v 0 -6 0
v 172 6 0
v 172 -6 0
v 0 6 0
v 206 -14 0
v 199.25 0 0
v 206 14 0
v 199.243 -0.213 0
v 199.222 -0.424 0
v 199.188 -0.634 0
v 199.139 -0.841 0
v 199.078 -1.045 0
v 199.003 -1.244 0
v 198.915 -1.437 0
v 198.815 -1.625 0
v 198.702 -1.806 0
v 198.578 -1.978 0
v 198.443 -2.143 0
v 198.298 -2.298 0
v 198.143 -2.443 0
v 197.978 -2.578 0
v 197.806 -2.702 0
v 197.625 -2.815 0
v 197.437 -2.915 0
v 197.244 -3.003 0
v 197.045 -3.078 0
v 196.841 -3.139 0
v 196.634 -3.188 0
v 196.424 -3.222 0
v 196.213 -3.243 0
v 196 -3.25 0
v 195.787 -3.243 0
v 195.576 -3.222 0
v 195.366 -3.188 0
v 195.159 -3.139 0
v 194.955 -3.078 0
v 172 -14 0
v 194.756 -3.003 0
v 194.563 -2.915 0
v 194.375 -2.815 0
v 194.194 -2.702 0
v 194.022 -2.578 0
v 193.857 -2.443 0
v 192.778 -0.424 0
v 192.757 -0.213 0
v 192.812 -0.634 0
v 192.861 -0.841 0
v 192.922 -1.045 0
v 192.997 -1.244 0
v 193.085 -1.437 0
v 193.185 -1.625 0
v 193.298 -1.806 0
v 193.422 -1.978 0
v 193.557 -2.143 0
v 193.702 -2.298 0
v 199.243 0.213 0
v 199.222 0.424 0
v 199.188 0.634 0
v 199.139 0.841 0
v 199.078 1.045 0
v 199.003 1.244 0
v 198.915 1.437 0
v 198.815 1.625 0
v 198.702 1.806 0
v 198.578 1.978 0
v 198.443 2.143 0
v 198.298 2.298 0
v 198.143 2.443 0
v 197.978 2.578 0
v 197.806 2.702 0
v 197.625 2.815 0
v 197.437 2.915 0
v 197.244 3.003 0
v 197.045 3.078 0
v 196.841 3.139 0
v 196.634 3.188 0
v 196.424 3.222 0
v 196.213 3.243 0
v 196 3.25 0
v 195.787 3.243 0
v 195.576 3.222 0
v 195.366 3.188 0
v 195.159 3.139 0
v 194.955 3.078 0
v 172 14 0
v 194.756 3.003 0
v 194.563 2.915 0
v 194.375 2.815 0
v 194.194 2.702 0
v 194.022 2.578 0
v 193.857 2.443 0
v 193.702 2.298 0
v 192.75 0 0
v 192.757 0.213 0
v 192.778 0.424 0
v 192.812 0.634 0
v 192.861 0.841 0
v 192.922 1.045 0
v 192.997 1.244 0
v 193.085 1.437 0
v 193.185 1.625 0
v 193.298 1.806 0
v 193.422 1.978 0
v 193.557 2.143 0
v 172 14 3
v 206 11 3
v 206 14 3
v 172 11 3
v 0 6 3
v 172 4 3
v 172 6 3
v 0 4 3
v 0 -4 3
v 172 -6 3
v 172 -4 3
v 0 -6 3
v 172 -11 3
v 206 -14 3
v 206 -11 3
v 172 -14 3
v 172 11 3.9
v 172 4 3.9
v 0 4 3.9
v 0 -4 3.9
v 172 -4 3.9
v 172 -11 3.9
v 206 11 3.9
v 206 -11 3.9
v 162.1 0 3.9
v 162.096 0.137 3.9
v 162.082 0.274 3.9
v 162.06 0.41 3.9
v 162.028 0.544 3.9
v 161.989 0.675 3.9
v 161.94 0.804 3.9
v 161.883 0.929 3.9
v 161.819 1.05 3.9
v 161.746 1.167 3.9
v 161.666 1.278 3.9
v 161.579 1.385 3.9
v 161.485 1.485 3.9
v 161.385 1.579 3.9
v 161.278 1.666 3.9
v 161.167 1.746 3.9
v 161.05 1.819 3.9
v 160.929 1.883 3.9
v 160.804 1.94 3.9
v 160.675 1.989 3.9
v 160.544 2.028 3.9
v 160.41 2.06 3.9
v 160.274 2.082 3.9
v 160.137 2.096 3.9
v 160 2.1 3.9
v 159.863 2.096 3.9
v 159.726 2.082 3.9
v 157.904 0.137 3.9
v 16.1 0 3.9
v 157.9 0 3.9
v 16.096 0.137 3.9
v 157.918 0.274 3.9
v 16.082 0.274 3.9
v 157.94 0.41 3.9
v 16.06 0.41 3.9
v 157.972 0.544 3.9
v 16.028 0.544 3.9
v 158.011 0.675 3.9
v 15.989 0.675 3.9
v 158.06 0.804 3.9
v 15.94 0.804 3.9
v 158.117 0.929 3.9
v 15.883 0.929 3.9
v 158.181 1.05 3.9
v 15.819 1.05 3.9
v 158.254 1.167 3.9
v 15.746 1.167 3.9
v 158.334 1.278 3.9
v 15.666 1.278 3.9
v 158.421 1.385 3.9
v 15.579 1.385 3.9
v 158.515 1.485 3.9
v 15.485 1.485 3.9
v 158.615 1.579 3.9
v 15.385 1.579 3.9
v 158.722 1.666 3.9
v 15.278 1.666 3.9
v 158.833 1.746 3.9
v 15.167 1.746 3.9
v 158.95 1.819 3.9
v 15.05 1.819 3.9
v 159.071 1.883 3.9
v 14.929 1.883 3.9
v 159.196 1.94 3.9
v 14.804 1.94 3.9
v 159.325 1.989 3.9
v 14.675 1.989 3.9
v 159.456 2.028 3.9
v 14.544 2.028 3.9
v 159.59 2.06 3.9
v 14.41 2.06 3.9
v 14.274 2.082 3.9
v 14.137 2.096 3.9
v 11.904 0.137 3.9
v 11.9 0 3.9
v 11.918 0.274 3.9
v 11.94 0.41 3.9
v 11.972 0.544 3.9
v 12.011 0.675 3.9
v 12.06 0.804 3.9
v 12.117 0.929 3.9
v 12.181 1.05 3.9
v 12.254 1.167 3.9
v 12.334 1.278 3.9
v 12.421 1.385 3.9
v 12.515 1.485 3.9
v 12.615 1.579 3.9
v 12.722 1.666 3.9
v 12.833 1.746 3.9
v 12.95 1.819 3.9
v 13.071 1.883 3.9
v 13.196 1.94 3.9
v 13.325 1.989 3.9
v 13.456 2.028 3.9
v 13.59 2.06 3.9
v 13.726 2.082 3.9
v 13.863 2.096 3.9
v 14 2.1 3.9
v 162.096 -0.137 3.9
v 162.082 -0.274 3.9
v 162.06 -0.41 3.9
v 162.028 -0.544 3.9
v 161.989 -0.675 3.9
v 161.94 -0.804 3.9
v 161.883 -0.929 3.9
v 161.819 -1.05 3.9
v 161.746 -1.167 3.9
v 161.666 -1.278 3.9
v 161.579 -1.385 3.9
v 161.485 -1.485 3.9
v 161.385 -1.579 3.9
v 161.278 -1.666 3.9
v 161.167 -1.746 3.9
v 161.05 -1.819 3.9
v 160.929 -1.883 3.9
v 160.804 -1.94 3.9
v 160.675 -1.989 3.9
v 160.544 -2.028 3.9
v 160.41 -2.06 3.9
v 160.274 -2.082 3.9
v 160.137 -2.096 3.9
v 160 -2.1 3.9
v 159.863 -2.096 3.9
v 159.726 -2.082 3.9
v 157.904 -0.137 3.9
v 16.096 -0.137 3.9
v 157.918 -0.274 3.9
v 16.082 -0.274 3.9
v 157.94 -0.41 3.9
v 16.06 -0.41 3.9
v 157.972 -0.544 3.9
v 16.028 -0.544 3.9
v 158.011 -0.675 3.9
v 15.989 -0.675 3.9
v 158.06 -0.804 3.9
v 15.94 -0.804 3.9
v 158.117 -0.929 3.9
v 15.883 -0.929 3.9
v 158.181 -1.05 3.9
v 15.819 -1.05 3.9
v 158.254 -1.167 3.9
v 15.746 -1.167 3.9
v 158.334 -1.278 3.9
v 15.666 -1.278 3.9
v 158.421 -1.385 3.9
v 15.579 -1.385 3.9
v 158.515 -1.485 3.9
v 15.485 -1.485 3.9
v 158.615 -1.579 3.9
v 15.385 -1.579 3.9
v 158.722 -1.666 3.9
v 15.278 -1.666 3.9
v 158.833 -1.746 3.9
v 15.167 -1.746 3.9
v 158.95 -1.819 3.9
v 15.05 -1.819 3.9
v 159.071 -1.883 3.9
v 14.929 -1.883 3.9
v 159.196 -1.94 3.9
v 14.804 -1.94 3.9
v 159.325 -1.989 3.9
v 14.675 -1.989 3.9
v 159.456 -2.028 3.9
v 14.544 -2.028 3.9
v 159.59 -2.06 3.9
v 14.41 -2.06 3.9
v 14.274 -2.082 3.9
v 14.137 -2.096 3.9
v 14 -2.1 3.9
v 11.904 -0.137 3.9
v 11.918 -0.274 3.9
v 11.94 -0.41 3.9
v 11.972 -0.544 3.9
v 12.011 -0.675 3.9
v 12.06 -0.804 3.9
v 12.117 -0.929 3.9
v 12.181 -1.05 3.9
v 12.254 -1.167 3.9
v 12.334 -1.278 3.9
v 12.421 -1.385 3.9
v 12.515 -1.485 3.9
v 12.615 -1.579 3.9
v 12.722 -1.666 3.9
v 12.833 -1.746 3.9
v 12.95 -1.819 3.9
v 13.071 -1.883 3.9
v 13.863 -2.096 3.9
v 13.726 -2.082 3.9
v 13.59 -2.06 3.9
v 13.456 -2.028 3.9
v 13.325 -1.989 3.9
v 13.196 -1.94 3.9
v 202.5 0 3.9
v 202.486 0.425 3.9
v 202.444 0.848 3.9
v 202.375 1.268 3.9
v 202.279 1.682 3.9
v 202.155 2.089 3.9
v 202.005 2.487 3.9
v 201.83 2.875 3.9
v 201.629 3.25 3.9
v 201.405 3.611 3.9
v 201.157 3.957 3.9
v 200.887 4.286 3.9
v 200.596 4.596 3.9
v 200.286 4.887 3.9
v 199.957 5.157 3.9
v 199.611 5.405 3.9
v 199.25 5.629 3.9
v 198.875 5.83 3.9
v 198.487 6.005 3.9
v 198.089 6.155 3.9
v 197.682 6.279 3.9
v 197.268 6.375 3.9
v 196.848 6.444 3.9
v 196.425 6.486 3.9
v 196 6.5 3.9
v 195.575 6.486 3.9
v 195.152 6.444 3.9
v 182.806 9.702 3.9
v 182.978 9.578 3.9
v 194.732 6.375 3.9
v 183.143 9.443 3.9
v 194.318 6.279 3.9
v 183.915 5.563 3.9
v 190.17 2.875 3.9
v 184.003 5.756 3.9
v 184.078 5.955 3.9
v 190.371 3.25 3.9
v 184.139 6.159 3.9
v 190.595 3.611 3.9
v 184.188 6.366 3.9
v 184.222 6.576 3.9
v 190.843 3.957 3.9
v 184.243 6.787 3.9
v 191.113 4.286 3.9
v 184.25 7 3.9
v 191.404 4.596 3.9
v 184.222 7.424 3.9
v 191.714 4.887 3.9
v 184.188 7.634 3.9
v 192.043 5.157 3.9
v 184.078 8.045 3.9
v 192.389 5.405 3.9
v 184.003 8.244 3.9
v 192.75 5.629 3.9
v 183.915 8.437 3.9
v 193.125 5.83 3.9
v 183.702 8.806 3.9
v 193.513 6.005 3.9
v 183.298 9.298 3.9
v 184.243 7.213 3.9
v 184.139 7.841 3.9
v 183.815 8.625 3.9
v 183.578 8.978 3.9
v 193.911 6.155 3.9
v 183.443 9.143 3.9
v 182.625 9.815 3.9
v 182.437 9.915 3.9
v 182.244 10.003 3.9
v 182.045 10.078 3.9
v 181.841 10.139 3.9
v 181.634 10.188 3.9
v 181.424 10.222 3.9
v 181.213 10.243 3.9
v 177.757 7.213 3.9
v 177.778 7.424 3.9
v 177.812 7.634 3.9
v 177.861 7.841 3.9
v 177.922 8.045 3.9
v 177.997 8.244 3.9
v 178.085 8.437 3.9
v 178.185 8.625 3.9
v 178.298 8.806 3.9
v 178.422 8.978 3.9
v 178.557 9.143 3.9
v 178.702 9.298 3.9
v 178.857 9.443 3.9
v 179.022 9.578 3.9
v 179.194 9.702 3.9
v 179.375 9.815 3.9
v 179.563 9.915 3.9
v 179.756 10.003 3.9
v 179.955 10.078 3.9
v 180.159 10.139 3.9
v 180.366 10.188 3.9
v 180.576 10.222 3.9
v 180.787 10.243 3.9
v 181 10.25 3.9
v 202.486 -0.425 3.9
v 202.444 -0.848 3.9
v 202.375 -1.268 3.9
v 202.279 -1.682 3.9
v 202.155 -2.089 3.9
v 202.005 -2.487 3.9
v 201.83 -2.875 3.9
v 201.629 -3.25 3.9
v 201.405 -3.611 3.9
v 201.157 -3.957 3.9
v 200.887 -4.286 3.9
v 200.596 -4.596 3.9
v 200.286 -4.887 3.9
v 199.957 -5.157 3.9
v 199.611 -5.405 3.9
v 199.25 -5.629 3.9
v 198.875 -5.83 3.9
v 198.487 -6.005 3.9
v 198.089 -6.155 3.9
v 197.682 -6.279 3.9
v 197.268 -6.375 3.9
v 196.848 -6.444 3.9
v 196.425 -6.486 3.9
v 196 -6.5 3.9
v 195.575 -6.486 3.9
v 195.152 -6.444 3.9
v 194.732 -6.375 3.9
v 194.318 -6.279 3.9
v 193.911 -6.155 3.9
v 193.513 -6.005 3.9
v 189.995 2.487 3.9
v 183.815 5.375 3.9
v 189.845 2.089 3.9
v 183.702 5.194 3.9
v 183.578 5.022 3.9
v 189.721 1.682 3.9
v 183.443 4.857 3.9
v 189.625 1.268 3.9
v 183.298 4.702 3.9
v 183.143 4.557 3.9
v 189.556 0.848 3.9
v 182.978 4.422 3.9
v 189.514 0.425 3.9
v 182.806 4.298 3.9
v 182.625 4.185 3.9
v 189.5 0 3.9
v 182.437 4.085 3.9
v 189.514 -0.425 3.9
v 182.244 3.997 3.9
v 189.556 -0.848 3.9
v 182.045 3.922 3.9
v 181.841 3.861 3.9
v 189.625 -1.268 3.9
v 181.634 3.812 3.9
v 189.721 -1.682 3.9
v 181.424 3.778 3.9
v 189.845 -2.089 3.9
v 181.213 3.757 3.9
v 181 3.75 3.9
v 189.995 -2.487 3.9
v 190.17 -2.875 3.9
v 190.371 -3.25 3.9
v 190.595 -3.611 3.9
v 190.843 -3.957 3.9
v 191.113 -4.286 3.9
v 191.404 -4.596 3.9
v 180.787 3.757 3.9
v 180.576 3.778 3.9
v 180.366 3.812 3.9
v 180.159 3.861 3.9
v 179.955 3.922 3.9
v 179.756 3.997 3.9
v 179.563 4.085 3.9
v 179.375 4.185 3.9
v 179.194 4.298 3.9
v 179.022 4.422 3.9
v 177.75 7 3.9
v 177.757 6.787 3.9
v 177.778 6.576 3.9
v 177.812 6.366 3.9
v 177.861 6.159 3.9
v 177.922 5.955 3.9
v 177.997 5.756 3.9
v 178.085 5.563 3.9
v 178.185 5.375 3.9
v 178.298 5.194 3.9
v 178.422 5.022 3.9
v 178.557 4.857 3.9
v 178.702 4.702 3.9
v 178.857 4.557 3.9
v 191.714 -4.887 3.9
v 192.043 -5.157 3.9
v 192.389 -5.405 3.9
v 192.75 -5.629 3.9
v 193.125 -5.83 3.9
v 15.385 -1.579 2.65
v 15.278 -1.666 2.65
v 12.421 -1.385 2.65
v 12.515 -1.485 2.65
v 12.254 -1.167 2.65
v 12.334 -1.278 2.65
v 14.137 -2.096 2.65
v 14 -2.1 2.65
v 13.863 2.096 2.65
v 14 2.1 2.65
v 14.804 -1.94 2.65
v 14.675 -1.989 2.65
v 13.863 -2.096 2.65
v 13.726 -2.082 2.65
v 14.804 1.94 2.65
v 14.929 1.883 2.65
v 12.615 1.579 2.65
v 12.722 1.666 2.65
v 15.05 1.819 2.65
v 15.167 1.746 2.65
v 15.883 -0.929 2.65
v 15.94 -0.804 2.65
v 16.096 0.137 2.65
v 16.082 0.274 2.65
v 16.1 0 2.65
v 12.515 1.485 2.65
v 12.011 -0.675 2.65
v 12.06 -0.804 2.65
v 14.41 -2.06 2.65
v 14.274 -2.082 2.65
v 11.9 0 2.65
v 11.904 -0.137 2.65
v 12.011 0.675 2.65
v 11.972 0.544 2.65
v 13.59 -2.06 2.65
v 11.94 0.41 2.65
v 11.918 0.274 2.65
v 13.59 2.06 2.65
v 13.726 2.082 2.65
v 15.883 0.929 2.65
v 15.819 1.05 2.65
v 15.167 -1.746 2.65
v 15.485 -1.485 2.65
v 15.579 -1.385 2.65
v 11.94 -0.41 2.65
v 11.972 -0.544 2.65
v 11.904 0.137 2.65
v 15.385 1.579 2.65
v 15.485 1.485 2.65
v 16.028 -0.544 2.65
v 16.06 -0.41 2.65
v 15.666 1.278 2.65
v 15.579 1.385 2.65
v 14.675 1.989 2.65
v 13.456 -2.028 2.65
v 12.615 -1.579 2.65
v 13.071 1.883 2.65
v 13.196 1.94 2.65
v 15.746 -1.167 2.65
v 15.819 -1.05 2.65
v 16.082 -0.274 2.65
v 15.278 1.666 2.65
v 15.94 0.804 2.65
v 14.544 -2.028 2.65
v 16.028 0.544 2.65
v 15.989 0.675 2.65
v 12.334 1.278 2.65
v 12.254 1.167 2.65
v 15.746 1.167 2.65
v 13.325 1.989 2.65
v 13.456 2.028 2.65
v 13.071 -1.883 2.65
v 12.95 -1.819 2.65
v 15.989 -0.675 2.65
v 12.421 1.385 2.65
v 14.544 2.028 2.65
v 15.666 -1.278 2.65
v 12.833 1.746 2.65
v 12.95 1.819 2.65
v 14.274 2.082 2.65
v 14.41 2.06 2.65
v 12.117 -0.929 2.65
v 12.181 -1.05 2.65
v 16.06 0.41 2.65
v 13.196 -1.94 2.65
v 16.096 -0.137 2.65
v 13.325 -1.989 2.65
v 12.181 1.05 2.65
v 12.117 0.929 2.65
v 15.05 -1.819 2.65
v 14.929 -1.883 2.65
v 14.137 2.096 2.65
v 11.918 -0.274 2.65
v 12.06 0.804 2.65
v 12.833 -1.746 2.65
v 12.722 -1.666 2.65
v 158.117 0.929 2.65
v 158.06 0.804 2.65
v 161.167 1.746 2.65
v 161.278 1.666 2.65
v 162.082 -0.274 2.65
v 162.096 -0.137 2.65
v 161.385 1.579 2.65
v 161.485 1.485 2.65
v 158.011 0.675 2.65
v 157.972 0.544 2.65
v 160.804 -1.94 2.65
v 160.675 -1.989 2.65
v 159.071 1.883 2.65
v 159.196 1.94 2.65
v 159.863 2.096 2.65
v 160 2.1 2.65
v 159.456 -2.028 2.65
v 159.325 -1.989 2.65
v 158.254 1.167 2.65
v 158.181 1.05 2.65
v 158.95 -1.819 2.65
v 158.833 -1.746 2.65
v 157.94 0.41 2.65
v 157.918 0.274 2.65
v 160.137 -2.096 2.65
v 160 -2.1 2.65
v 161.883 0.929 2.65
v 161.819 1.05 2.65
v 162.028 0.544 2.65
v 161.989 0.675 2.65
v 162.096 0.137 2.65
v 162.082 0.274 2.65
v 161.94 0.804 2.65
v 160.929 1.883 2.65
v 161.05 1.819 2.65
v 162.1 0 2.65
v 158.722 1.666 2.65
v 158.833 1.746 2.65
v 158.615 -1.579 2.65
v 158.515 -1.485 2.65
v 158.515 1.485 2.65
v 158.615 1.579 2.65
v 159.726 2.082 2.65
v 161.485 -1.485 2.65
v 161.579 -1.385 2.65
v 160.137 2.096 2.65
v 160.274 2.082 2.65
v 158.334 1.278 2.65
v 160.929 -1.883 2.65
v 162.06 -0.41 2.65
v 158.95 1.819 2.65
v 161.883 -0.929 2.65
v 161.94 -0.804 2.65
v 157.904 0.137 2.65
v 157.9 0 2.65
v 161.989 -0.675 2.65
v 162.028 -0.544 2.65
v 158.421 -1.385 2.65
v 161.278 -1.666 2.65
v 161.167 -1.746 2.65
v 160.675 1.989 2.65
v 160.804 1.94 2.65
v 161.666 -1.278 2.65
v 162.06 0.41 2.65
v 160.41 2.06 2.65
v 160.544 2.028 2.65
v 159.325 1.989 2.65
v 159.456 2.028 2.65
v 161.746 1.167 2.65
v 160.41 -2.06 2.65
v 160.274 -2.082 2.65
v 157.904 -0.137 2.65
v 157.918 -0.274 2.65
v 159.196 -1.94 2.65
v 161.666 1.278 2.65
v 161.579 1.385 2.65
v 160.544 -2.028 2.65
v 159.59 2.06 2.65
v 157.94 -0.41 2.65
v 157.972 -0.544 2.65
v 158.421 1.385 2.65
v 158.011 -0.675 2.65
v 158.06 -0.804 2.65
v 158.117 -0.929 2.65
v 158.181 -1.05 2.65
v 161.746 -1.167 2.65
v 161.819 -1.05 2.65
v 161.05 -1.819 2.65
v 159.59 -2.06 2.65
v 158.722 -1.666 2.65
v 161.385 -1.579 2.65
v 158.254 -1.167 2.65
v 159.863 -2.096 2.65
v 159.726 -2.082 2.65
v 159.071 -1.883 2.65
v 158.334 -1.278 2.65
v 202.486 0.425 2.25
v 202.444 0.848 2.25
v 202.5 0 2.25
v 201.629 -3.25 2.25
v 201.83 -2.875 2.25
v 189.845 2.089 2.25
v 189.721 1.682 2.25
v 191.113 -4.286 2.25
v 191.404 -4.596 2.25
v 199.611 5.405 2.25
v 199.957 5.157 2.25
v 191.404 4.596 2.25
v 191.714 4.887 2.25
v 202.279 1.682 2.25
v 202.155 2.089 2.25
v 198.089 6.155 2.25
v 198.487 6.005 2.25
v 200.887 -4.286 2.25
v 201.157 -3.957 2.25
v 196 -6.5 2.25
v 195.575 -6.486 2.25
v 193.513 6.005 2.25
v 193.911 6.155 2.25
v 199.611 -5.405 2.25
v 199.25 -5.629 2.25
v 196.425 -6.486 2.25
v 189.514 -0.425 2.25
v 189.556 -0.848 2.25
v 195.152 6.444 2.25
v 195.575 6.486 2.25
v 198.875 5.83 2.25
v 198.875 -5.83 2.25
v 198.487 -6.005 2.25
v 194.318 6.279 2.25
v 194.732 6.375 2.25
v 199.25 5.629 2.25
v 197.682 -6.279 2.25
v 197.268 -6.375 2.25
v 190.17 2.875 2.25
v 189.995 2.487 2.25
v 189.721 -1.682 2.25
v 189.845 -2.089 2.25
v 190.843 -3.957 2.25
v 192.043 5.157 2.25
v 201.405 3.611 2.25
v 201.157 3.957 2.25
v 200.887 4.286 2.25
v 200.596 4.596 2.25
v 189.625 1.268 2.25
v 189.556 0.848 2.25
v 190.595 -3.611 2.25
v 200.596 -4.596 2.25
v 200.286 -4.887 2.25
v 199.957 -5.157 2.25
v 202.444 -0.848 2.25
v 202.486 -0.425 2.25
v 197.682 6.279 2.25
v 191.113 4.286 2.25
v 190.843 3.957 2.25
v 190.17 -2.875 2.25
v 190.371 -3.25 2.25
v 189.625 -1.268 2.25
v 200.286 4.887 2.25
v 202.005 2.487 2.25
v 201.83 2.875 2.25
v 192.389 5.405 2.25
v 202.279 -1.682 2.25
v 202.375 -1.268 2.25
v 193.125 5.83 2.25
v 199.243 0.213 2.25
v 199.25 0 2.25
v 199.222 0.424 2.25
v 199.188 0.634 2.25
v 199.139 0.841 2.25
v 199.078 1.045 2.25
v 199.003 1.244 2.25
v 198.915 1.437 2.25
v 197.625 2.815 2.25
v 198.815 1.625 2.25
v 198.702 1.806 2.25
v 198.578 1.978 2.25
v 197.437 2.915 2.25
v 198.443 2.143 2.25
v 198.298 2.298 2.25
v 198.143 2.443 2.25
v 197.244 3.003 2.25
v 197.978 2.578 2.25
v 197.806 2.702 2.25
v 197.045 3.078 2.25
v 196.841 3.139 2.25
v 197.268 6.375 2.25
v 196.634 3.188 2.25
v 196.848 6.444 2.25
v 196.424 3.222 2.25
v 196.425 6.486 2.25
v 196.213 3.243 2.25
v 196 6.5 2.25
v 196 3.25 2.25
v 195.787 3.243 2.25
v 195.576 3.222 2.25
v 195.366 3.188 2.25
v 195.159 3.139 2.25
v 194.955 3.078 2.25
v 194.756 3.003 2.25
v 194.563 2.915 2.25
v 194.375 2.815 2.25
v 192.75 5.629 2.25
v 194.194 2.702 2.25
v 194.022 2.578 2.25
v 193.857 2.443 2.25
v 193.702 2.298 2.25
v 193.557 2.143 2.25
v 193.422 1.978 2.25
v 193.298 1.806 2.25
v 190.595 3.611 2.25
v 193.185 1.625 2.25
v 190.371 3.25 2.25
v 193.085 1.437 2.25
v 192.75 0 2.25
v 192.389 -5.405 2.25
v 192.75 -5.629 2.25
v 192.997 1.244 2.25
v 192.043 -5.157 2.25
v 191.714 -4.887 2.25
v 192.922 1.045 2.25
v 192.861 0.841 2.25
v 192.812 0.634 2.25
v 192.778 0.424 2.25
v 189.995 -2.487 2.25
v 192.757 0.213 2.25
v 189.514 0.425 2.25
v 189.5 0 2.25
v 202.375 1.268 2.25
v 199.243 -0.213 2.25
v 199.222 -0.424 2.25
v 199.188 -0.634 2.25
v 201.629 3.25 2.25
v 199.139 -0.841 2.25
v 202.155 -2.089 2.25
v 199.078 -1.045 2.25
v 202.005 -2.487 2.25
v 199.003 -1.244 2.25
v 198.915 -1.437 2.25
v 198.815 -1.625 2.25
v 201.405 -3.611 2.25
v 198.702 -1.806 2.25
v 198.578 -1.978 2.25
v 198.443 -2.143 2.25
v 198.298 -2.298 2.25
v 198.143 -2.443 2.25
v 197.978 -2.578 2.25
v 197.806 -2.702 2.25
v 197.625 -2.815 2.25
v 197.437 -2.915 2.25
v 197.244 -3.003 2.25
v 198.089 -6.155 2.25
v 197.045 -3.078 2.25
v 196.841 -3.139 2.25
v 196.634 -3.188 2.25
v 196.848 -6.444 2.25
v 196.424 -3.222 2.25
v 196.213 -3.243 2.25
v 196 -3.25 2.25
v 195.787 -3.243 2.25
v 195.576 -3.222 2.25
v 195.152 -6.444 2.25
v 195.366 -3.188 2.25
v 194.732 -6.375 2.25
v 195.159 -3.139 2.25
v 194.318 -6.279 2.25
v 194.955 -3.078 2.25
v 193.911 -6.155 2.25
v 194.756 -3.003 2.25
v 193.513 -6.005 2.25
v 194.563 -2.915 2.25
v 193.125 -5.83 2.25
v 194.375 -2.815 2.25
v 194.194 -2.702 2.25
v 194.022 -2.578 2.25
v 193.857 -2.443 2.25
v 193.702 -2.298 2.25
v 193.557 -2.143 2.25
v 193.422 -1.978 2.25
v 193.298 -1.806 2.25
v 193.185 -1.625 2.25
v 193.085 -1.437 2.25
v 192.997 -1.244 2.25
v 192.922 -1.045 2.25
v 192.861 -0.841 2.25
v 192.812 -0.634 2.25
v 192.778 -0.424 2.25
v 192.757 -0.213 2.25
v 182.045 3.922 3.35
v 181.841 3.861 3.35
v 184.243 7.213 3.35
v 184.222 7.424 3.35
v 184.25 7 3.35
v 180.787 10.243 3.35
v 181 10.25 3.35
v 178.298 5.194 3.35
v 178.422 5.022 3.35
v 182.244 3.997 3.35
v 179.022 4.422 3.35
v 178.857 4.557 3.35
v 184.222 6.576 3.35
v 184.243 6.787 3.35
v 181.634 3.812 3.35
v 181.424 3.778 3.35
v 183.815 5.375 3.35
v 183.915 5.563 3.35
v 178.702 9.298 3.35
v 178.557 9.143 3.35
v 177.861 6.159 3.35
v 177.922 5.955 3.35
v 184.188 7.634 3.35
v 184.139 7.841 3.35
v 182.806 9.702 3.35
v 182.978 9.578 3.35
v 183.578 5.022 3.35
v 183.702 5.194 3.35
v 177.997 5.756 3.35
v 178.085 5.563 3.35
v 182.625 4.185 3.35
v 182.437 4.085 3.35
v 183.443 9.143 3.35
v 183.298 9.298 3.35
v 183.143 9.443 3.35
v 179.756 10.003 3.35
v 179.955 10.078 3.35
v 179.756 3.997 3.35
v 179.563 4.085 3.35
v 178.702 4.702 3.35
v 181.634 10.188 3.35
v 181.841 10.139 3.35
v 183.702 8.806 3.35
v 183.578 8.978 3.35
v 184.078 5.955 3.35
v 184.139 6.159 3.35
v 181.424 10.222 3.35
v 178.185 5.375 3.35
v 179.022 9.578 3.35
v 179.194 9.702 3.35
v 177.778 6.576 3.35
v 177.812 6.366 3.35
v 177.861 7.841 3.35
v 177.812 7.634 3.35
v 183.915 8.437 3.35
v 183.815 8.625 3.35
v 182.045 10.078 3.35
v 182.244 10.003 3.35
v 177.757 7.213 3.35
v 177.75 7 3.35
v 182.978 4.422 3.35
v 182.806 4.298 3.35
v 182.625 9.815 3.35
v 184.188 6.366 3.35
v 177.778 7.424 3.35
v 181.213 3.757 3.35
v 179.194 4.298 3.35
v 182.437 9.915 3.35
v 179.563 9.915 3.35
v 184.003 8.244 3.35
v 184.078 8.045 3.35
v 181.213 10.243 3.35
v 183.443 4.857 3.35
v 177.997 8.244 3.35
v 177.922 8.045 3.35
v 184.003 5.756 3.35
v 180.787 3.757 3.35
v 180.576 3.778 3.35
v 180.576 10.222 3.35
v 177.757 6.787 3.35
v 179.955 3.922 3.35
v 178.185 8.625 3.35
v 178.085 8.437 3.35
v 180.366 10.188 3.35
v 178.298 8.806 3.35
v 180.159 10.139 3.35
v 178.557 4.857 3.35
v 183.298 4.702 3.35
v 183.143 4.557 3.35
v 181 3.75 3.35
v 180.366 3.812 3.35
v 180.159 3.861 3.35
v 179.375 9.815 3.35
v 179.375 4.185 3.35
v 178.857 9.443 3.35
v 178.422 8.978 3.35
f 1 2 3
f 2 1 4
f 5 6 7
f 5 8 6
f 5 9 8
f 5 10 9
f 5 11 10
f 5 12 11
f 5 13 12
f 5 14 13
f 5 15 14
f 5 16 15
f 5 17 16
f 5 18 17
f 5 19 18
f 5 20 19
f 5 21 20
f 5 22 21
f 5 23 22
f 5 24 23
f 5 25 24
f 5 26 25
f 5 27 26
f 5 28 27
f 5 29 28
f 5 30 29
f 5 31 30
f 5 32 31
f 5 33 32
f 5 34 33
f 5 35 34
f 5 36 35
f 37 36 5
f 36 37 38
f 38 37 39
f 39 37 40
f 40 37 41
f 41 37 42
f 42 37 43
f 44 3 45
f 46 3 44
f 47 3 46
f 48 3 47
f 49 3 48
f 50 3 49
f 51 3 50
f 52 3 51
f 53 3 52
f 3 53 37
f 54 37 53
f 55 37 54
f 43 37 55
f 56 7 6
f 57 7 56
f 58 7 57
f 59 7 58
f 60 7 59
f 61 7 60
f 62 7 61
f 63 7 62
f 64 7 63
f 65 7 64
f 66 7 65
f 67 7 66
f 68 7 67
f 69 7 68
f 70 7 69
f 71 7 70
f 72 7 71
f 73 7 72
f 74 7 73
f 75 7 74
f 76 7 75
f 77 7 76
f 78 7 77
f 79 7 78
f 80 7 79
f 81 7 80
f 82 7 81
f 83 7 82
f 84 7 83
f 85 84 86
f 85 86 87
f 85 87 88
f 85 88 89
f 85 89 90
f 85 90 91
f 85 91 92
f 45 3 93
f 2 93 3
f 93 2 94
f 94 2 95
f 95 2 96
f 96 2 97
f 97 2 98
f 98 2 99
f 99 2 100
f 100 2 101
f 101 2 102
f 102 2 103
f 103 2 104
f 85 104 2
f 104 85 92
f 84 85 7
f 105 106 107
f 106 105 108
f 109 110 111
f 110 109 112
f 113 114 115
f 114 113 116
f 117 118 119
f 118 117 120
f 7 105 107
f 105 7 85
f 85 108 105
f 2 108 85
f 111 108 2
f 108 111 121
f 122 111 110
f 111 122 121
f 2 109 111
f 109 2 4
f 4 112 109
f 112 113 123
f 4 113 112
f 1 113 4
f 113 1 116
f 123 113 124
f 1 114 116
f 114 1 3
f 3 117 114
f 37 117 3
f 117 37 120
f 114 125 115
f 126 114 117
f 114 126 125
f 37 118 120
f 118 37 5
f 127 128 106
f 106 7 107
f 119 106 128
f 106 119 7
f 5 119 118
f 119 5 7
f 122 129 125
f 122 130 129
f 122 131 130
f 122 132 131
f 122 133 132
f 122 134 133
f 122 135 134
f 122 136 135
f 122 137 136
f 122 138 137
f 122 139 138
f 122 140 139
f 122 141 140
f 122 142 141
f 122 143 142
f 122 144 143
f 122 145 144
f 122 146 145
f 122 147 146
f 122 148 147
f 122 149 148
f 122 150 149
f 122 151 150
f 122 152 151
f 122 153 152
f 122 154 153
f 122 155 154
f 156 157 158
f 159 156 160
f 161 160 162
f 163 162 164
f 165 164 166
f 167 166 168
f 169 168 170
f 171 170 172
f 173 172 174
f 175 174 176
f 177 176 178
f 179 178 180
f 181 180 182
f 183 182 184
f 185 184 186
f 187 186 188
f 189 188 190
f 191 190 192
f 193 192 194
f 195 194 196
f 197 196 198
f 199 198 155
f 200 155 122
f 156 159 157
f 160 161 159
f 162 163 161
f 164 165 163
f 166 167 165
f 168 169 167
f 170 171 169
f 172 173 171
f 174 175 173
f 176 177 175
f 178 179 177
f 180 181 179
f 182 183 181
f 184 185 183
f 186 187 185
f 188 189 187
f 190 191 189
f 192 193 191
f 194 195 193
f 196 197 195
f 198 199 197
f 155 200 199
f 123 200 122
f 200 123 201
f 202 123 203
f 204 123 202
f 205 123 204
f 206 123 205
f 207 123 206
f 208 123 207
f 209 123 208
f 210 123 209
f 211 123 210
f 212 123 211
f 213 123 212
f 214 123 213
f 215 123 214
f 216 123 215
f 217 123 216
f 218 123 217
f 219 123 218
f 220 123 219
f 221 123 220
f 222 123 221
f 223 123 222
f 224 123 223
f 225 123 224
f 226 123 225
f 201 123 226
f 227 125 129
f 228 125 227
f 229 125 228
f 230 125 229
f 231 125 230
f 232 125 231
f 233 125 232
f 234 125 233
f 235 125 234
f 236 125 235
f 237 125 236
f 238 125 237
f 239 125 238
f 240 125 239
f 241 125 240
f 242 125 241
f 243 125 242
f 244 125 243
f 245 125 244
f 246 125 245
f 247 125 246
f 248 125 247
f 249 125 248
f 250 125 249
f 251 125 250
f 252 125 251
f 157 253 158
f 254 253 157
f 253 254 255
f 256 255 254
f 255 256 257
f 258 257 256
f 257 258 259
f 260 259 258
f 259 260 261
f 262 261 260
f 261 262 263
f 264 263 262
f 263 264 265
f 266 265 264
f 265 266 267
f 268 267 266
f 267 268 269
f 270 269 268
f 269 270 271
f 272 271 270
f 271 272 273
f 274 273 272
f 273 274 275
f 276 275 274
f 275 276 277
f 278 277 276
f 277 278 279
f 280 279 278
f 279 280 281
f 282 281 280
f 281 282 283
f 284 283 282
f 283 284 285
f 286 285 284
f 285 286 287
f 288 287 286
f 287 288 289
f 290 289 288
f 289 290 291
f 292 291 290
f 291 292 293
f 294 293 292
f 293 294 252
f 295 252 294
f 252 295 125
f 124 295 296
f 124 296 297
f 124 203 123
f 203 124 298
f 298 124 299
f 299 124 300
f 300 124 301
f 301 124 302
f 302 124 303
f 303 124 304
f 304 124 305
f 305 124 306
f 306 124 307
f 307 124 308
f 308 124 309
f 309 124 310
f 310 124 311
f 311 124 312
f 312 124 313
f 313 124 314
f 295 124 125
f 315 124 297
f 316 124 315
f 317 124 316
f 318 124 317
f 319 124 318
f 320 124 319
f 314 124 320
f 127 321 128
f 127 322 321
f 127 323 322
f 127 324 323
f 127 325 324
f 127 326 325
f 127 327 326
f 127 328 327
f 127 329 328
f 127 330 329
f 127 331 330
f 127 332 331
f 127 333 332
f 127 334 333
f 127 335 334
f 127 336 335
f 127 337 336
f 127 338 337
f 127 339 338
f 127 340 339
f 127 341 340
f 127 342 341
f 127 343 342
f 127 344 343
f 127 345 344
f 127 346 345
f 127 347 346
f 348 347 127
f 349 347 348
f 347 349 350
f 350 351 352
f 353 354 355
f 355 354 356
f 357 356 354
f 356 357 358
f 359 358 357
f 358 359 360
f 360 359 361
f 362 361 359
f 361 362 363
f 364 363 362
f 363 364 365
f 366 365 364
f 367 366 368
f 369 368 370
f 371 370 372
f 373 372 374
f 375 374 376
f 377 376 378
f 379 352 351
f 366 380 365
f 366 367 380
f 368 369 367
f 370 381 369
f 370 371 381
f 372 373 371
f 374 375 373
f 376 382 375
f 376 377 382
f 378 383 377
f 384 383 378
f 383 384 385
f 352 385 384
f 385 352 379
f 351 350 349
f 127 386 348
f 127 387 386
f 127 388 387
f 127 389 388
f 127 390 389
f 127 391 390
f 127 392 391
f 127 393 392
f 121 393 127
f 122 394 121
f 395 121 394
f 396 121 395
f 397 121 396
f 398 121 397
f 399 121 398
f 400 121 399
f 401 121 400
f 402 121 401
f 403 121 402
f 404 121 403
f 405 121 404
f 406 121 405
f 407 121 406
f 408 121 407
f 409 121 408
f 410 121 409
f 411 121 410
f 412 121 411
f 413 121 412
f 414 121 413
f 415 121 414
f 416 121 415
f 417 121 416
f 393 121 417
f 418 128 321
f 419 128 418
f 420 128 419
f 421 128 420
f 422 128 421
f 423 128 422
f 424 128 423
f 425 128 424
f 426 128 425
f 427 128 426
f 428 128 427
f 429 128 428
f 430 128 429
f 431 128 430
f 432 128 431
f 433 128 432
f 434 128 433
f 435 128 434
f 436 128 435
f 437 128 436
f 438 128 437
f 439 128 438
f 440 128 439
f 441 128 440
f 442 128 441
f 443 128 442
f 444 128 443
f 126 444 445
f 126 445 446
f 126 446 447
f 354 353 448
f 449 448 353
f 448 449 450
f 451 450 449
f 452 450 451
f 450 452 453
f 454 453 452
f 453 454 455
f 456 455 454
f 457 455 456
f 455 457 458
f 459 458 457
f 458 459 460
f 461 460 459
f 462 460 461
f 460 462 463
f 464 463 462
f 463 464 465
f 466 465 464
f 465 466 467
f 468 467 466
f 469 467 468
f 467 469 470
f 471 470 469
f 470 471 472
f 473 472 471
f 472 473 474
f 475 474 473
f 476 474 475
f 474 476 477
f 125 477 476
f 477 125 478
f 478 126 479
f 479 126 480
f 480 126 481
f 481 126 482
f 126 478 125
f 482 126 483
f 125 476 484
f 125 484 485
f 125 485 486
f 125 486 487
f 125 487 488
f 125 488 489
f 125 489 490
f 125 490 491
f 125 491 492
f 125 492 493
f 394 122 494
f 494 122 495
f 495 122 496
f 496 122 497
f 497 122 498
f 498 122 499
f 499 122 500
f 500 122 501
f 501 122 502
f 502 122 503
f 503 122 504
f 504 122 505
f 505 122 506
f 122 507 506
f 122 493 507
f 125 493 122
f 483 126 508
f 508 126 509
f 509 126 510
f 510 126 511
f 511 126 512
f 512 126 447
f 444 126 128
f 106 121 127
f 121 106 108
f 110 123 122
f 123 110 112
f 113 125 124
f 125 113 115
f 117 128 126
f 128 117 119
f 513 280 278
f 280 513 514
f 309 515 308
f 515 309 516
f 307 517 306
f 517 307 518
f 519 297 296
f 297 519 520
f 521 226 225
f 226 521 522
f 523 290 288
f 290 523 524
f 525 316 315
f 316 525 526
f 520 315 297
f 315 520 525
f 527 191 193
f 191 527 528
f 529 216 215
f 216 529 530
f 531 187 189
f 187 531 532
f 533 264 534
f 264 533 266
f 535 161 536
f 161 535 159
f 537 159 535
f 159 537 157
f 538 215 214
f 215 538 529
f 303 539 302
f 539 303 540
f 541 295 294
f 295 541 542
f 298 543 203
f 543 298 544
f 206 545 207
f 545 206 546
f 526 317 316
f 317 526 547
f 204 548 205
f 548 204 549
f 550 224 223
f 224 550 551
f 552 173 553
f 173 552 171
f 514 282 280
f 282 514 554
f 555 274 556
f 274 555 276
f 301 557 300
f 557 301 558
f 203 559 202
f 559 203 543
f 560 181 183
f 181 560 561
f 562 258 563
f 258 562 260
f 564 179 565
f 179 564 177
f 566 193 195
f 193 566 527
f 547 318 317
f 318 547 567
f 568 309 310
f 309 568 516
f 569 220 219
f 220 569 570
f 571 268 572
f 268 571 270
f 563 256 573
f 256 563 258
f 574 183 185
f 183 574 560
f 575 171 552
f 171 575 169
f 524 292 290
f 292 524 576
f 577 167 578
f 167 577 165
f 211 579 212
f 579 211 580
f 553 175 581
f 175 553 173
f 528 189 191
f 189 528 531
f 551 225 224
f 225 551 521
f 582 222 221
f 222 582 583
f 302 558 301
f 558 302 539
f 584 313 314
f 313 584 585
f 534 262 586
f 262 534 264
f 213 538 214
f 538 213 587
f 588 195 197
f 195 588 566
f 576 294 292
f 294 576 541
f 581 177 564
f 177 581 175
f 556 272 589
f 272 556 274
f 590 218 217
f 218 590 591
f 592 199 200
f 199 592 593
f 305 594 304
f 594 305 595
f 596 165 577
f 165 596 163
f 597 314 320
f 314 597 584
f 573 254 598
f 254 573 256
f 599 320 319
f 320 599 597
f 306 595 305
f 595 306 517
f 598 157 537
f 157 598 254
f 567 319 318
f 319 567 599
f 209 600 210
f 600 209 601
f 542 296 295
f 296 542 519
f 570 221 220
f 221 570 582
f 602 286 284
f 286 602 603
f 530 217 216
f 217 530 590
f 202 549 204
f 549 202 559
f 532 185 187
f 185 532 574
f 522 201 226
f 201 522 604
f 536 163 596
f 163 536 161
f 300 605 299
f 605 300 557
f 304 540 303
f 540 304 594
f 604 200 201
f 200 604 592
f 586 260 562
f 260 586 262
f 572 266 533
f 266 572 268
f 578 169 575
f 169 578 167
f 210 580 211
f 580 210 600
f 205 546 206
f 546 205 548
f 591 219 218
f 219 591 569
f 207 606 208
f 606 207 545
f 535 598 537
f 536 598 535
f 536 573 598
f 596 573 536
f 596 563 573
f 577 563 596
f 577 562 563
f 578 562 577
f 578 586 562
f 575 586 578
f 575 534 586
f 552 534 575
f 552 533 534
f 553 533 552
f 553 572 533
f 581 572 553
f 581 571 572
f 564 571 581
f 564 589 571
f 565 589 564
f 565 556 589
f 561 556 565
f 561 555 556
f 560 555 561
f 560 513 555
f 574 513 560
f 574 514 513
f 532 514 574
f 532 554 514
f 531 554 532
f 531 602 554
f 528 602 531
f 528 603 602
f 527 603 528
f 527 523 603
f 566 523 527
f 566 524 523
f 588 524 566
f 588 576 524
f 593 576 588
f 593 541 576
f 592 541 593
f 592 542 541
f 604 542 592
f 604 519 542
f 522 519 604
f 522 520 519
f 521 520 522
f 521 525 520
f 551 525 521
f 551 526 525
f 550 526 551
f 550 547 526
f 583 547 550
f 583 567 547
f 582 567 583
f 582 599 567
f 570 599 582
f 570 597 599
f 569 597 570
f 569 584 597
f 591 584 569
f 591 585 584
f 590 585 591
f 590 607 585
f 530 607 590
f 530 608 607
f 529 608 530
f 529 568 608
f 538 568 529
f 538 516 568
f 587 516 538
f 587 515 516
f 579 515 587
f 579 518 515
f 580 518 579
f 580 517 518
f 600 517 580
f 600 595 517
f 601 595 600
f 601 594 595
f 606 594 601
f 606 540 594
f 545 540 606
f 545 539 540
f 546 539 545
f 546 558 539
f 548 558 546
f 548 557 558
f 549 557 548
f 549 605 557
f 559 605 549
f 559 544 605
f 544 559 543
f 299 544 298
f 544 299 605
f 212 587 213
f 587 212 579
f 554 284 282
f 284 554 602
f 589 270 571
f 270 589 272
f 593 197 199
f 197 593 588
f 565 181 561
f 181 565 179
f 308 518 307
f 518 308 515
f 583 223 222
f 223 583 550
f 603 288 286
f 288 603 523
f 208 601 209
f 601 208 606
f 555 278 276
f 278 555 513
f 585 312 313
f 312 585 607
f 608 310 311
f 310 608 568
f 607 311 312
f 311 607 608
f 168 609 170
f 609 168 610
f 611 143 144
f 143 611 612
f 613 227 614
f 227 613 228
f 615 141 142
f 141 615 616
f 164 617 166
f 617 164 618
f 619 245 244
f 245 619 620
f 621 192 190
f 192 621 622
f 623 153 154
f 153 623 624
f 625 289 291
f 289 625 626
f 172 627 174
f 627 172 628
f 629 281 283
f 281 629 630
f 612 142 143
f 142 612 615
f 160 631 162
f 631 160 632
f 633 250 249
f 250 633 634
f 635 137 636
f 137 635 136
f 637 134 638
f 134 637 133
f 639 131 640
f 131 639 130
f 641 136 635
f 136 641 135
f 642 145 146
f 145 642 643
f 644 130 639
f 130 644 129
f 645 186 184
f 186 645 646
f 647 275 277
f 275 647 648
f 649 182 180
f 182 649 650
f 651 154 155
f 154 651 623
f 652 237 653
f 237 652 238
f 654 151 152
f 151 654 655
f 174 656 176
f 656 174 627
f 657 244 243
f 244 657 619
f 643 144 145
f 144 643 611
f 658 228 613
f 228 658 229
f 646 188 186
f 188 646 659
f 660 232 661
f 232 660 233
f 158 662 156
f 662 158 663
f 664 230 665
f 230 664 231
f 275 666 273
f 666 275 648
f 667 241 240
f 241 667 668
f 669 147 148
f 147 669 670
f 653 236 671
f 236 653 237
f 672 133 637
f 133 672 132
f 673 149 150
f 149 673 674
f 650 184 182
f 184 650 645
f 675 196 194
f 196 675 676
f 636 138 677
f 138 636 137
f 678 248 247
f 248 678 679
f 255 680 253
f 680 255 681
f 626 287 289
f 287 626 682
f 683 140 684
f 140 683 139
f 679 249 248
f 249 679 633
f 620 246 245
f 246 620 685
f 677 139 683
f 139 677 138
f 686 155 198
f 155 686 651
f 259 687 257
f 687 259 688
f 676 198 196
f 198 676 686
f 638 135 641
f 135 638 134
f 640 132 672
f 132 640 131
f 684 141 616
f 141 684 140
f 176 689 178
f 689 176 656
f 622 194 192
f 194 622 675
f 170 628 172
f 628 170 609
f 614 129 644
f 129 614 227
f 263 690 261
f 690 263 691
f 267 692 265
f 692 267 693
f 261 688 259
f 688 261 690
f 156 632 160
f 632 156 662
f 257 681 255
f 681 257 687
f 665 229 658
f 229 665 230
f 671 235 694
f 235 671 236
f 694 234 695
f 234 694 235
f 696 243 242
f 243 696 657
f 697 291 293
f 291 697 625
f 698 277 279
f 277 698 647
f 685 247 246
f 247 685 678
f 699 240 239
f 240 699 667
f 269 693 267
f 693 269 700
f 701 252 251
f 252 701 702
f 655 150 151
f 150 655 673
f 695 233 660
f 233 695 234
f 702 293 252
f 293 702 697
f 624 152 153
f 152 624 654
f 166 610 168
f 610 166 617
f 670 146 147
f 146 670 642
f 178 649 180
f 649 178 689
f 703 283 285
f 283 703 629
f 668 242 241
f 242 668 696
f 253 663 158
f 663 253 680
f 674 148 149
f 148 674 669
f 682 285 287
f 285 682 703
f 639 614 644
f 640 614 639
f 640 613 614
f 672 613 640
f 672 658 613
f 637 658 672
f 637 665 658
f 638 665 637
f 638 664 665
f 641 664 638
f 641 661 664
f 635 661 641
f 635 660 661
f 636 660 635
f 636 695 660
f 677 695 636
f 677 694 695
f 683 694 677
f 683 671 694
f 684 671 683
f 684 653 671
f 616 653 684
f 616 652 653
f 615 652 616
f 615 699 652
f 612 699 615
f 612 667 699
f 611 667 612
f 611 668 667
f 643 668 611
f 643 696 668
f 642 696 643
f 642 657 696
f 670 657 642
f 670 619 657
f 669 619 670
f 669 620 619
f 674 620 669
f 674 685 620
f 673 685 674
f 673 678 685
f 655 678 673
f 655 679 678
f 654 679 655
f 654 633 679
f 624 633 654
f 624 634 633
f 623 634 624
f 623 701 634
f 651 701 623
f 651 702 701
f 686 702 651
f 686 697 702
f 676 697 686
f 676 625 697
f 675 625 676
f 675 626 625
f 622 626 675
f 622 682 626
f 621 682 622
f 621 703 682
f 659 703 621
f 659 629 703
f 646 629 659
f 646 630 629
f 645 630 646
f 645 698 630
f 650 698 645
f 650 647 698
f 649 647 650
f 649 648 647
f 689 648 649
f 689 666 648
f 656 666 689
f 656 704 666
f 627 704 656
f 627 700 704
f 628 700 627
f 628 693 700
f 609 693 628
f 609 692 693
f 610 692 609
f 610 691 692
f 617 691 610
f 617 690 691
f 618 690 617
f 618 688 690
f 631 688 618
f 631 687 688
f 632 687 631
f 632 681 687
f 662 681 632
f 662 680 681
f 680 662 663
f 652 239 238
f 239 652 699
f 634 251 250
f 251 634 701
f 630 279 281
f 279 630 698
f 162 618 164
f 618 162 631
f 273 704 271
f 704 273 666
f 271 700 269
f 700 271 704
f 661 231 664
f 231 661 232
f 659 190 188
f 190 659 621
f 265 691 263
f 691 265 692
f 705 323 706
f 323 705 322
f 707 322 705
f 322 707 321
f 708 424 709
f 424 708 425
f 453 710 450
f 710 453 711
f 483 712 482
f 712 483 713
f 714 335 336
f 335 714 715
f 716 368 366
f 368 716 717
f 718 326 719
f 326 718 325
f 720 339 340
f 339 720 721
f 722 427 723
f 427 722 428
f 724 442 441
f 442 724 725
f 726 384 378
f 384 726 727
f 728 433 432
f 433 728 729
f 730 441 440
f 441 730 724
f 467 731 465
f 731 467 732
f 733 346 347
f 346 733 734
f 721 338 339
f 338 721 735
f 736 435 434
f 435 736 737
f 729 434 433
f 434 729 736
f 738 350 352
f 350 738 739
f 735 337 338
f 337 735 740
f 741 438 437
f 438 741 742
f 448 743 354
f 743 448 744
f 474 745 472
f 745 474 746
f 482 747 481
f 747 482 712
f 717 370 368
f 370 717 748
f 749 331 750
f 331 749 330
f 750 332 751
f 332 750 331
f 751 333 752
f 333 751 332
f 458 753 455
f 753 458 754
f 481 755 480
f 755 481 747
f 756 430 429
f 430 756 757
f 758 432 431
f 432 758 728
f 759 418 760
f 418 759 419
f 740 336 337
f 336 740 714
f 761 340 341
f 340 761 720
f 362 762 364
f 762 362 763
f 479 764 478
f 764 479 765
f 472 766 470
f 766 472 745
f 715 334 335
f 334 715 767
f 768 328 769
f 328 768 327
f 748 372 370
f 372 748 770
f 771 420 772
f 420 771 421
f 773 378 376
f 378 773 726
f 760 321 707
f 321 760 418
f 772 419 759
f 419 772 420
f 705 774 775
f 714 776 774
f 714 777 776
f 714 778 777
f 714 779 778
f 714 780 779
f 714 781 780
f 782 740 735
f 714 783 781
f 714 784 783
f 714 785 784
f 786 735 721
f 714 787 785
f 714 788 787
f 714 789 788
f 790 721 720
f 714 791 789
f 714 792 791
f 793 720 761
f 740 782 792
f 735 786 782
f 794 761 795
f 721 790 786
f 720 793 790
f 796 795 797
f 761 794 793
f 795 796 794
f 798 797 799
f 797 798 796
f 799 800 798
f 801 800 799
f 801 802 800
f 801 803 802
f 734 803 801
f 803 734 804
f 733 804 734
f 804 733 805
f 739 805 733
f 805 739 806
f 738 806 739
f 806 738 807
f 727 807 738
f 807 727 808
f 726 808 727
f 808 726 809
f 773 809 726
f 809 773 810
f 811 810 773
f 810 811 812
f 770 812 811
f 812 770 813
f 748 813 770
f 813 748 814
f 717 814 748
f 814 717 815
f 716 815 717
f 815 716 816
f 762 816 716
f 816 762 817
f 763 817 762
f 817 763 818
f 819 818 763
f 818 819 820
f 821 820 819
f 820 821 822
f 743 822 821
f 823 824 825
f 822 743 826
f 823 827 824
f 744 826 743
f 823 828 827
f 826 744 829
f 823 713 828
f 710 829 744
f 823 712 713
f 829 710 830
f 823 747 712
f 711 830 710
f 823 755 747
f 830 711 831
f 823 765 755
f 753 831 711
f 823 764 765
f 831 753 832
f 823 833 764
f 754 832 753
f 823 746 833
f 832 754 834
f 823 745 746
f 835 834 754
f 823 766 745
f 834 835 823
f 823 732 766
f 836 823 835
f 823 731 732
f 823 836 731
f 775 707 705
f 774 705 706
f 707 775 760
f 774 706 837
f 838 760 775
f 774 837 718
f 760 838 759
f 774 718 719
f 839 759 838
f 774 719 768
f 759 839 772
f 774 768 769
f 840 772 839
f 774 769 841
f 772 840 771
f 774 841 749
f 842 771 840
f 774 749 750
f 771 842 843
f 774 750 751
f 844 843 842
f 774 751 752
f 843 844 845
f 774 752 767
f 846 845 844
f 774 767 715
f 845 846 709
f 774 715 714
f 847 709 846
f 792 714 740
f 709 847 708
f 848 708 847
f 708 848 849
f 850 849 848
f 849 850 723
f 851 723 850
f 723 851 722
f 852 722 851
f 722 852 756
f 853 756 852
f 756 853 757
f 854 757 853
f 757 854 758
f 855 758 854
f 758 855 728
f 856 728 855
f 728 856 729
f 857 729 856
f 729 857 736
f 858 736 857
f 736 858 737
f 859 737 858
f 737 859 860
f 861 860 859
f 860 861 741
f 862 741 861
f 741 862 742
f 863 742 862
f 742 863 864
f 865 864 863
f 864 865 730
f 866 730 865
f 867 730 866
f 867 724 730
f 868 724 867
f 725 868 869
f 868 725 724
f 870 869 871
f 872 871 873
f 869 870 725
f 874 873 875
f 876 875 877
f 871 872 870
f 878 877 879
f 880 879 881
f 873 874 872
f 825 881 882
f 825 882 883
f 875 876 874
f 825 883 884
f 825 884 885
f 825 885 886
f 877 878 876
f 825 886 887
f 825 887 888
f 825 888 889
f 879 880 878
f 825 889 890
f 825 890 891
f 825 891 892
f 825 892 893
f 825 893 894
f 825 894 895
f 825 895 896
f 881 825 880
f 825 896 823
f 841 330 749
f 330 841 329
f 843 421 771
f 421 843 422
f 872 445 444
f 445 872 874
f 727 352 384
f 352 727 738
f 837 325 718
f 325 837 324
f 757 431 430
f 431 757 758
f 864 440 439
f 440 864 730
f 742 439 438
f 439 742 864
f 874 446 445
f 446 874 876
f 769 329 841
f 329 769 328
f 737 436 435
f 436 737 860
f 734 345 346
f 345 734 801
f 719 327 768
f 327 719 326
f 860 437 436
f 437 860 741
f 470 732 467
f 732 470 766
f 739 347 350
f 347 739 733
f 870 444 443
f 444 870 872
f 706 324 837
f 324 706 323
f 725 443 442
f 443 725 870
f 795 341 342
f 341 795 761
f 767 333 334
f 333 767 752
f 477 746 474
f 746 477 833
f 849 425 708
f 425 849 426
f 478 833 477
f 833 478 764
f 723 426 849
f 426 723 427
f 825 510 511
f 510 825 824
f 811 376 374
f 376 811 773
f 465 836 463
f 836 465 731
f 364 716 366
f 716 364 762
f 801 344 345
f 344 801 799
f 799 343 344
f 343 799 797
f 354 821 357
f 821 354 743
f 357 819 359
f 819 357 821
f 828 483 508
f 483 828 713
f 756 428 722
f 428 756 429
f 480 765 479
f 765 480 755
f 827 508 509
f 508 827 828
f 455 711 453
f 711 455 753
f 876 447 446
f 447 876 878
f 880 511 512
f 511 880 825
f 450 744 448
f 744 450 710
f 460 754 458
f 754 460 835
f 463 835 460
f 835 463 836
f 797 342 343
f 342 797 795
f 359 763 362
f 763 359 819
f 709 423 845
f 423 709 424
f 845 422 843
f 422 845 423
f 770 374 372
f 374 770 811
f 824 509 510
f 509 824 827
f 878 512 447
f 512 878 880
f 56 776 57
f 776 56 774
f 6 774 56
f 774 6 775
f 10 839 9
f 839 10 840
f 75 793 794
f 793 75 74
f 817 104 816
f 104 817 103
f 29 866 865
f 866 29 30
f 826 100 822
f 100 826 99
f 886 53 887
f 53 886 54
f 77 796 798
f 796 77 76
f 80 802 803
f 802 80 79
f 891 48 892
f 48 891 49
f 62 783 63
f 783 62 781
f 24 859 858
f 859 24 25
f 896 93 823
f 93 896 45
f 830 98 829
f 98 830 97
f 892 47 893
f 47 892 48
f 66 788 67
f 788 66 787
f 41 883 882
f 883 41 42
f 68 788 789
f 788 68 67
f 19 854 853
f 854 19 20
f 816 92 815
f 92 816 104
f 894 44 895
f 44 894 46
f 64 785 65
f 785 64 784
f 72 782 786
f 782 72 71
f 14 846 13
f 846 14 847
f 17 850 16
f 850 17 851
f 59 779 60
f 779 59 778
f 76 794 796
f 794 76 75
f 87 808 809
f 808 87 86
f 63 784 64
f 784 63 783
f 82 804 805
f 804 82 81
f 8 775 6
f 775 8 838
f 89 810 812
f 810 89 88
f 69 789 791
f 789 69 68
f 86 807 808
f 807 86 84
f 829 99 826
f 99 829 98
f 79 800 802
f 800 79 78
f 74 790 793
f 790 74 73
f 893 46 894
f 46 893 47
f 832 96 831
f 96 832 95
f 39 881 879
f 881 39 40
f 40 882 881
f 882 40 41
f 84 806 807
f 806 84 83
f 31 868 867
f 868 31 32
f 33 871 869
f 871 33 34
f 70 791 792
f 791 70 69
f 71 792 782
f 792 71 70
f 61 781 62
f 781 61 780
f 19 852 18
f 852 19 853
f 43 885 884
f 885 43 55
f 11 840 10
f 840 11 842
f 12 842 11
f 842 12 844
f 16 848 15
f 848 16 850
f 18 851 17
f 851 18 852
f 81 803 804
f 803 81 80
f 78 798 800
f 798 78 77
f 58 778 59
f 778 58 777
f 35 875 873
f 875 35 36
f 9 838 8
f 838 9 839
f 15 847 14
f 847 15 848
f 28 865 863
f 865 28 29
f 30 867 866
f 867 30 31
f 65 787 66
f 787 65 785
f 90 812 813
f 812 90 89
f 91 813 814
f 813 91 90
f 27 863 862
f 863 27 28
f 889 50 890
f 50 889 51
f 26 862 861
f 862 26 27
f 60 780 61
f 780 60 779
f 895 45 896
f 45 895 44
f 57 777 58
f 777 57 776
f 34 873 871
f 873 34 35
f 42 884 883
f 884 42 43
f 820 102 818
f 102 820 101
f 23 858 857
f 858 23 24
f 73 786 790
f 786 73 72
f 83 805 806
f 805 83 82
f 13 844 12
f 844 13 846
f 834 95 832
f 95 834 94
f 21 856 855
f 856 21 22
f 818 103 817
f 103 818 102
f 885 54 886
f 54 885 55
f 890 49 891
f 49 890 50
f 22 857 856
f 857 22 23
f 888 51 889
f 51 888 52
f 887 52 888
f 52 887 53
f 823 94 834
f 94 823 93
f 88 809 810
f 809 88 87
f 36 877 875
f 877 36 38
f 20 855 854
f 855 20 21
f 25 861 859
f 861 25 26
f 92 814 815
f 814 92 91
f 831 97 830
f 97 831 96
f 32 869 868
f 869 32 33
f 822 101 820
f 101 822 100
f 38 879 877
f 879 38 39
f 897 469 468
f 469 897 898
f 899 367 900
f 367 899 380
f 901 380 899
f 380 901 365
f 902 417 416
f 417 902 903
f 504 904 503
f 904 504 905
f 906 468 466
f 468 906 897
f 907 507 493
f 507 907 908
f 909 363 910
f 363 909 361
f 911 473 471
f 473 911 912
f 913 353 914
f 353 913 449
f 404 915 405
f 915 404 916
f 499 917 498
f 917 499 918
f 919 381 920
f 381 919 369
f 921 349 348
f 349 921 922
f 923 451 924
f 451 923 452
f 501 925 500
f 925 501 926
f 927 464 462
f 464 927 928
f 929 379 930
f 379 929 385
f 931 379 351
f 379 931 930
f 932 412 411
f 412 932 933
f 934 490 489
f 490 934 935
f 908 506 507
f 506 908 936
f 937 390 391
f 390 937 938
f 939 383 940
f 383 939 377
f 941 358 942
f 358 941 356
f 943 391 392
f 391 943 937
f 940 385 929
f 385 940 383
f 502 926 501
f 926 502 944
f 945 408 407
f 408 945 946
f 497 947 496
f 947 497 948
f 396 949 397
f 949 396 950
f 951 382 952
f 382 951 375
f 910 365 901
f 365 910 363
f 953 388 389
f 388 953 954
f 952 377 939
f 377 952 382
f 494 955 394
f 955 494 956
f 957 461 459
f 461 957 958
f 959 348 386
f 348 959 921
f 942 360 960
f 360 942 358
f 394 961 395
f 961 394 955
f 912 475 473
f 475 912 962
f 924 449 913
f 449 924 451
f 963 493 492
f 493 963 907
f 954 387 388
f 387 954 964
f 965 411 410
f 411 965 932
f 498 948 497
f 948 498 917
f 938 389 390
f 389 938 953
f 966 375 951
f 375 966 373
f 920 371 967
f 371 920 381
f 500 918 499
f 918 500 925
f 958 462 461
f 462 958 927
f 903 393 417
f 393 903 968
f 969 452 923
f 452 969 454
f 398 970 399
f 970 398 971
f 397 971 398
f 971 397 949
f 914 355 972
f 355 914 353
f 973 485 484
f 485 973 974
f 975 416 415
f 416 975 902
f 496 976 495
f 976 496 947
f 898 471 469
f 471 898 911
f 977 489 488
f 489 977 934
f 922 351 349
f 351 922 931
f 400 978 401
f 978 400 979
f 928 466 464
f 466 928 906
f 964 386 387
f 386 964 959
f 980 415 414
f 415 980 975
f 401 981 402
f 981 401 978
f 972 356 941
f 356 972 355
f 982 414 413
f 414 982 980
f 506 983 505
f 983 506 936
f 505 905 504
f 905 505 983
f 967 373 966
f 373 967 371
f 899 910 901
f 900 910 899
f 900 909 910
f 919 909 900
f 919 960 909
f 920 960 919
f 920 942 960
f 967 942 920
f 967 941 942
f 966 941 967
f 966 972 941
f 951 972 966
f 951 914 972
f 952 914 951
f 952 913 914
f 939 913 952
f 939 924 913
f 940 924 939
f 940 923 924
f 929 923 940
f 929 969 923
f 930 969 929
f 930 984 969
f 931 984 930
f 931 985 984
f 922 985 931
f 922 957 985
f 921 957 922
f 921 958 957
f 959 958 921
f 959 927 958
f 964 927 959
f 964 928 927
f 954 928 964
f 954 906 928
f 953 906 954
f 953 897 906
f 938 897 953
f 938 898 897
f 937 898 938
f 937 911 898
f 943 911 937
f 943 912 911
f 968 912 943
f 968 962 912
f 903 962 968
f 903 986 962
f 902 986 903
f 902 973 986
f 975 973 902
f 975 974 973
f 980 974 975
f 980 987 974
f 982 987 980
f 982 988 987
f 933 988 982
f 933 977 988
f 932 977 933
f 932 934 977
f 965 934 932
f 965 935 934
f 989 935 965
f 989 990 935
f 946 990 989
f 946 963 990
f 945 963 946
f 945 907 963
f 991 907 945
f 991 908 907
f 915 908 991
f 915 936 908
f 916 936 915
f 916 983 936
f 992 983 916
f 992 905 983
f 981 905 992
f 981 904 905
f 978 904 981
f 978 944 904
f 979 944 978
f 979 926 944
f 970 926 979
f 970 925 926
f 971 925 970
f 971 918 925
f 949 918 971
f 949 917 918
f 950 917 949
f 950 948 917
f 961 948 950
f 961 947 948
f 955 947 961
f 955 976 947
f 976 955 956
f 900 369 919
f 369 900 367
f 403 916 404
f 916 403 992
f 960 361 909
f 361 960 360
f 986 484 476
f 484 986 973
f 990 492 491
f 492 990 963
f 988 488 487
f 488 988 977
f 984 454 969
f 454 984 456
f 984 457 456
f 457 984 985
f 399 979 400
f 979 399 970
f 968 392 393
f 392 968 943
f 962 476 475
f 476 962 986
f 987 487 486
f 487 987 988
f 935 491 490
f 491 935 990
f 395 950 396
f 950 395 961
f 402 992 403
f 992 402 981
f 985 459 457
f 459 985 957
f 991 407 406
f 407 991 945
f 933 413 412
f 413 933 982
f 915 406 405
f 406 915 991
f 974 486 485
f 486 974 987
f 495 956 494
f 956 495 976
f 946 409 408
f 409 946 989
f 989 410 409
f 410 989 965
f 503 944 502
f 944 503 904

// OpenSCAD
// Parameters
$fn = 96;
eps = 0.05;
layer_overlap = 0.02;

// Rail dimensions
rail_length = 180;
rail_width = 12;
rail_base_height = 3.0;
rail_top_width = 8;
top_layer_height = 0.9;

// Wider end block
end_block_length = 34;
end_block_overlap = 8;
end_block_width = 28;
end_block_top_width = 22;

// Rail removed features
rail_recess_diameter = 4.2;
rail_recess_depth = top_layer_height + 0.35;
rail_left_recess_x = 14;
rail_right_recess_offset = 12;
rail_recess_y = 0;

// End block removed features
block_shallow_recess_diameter = 6.5;
block_shallow_recess_depth = 0.55;
block_shallow_recess_y = 7;

counterbore_diameter = 13;
counterbore_depth = top_layer_height + 0.75;
deep_cut_diameter = 6.5;

// Derived dimensions
block_start_x = rail_length - end_block_overlap;
block_center_x = block_start_x + end_block_length / 2;
part_height = rail_base_height + top_layer_height;

rail_right_recess_x = block_start_x - rail_right_recess_offset;
block_shallow_recess_x = block_start_x + 9;
deep_cut_x = block_start_x + 24;
deep_cut_y = 0;

// 2D rail footprint
module rail_footprint(w) {
    translate([rail_length / 2, 0])
        square([rail_length, w], center=true);
}

// 2D end block footprint
module end_block_footprint(w) {
    translate([block_center_x, 0])
        square([end_block_length, w], center=true);
}

// Lower body outline
module lower_body_2d() {
    union() {
        rail_footprint(rail_width);
        end_block_footprint(end_block_width);
    }
}

// Shallow top layer outline
module top_layer_2d() {
    union() {
        rail_footprint(rail_top_width);
        end_block_footprint(end_block_top_width);
    }
}

// Main lower rail and wider end block
module lower_body() {
    linear_extrude(height=rail_base_height, convexity=2)
        lower_body_2d();
}

// Full-length shallow raised top layer
module shallow_top_layer() {
    translate([0, 0, rail_base_height - layer_overlap])
        linear_extrude(height=top_layer_height + layer_overlap, convexity=2)
            top_layer_2d();
}

// Complete solid before cuts
module main_solid() {
    union() {
        lower_body();
        shallow_top_layer();
    }
}

// Blind circular recess from top
module circular_recess(x, y, d, depth) {
    translate([x, y, part_height - depth])
        cylinder(h=depth + eps, d=d, center=false);
}

// Full-depth circular cut
module through_cut(x, y, d) {
    translate([x, y, -eps])
        cylinder(h=part_height + 2 * eps, d=d, center=false);
}

// Stepped end cutout: shallow counterbore plus deeper through cut
module stepped_deep_cutout(x, y) {
    union() {
        circular_recess(x, y, counterbore_diameter, counterbore_depth);
        through_cut(x, y, deep_cut_diameter);
    }
}

// Rail end recesses along the narrow band
module rail_removed_features() {
    circular_recess(rail_left_recess_x, rail_recess_y, rail_recess_diameter, rail_recess_depth);
    circular_recess(rail_right_recess_x, rail_recess_y, rail_recess_diameter, rail_recess_depth);
}

// Wider end block recesses and deeper cutout
module end_block_removed_features() {
    circular_recess(block_shallow_recess_x, block_shallow_recess_y, block_shallow_recess_diameter, block_shallow_recess_depth);
    stepped_deep_cutout(deep_cut_x, deep_cut_y);
}

// Final model
difference() {
    main_solid();
    rail_removed_features();
    end_block_removed_features();
}
